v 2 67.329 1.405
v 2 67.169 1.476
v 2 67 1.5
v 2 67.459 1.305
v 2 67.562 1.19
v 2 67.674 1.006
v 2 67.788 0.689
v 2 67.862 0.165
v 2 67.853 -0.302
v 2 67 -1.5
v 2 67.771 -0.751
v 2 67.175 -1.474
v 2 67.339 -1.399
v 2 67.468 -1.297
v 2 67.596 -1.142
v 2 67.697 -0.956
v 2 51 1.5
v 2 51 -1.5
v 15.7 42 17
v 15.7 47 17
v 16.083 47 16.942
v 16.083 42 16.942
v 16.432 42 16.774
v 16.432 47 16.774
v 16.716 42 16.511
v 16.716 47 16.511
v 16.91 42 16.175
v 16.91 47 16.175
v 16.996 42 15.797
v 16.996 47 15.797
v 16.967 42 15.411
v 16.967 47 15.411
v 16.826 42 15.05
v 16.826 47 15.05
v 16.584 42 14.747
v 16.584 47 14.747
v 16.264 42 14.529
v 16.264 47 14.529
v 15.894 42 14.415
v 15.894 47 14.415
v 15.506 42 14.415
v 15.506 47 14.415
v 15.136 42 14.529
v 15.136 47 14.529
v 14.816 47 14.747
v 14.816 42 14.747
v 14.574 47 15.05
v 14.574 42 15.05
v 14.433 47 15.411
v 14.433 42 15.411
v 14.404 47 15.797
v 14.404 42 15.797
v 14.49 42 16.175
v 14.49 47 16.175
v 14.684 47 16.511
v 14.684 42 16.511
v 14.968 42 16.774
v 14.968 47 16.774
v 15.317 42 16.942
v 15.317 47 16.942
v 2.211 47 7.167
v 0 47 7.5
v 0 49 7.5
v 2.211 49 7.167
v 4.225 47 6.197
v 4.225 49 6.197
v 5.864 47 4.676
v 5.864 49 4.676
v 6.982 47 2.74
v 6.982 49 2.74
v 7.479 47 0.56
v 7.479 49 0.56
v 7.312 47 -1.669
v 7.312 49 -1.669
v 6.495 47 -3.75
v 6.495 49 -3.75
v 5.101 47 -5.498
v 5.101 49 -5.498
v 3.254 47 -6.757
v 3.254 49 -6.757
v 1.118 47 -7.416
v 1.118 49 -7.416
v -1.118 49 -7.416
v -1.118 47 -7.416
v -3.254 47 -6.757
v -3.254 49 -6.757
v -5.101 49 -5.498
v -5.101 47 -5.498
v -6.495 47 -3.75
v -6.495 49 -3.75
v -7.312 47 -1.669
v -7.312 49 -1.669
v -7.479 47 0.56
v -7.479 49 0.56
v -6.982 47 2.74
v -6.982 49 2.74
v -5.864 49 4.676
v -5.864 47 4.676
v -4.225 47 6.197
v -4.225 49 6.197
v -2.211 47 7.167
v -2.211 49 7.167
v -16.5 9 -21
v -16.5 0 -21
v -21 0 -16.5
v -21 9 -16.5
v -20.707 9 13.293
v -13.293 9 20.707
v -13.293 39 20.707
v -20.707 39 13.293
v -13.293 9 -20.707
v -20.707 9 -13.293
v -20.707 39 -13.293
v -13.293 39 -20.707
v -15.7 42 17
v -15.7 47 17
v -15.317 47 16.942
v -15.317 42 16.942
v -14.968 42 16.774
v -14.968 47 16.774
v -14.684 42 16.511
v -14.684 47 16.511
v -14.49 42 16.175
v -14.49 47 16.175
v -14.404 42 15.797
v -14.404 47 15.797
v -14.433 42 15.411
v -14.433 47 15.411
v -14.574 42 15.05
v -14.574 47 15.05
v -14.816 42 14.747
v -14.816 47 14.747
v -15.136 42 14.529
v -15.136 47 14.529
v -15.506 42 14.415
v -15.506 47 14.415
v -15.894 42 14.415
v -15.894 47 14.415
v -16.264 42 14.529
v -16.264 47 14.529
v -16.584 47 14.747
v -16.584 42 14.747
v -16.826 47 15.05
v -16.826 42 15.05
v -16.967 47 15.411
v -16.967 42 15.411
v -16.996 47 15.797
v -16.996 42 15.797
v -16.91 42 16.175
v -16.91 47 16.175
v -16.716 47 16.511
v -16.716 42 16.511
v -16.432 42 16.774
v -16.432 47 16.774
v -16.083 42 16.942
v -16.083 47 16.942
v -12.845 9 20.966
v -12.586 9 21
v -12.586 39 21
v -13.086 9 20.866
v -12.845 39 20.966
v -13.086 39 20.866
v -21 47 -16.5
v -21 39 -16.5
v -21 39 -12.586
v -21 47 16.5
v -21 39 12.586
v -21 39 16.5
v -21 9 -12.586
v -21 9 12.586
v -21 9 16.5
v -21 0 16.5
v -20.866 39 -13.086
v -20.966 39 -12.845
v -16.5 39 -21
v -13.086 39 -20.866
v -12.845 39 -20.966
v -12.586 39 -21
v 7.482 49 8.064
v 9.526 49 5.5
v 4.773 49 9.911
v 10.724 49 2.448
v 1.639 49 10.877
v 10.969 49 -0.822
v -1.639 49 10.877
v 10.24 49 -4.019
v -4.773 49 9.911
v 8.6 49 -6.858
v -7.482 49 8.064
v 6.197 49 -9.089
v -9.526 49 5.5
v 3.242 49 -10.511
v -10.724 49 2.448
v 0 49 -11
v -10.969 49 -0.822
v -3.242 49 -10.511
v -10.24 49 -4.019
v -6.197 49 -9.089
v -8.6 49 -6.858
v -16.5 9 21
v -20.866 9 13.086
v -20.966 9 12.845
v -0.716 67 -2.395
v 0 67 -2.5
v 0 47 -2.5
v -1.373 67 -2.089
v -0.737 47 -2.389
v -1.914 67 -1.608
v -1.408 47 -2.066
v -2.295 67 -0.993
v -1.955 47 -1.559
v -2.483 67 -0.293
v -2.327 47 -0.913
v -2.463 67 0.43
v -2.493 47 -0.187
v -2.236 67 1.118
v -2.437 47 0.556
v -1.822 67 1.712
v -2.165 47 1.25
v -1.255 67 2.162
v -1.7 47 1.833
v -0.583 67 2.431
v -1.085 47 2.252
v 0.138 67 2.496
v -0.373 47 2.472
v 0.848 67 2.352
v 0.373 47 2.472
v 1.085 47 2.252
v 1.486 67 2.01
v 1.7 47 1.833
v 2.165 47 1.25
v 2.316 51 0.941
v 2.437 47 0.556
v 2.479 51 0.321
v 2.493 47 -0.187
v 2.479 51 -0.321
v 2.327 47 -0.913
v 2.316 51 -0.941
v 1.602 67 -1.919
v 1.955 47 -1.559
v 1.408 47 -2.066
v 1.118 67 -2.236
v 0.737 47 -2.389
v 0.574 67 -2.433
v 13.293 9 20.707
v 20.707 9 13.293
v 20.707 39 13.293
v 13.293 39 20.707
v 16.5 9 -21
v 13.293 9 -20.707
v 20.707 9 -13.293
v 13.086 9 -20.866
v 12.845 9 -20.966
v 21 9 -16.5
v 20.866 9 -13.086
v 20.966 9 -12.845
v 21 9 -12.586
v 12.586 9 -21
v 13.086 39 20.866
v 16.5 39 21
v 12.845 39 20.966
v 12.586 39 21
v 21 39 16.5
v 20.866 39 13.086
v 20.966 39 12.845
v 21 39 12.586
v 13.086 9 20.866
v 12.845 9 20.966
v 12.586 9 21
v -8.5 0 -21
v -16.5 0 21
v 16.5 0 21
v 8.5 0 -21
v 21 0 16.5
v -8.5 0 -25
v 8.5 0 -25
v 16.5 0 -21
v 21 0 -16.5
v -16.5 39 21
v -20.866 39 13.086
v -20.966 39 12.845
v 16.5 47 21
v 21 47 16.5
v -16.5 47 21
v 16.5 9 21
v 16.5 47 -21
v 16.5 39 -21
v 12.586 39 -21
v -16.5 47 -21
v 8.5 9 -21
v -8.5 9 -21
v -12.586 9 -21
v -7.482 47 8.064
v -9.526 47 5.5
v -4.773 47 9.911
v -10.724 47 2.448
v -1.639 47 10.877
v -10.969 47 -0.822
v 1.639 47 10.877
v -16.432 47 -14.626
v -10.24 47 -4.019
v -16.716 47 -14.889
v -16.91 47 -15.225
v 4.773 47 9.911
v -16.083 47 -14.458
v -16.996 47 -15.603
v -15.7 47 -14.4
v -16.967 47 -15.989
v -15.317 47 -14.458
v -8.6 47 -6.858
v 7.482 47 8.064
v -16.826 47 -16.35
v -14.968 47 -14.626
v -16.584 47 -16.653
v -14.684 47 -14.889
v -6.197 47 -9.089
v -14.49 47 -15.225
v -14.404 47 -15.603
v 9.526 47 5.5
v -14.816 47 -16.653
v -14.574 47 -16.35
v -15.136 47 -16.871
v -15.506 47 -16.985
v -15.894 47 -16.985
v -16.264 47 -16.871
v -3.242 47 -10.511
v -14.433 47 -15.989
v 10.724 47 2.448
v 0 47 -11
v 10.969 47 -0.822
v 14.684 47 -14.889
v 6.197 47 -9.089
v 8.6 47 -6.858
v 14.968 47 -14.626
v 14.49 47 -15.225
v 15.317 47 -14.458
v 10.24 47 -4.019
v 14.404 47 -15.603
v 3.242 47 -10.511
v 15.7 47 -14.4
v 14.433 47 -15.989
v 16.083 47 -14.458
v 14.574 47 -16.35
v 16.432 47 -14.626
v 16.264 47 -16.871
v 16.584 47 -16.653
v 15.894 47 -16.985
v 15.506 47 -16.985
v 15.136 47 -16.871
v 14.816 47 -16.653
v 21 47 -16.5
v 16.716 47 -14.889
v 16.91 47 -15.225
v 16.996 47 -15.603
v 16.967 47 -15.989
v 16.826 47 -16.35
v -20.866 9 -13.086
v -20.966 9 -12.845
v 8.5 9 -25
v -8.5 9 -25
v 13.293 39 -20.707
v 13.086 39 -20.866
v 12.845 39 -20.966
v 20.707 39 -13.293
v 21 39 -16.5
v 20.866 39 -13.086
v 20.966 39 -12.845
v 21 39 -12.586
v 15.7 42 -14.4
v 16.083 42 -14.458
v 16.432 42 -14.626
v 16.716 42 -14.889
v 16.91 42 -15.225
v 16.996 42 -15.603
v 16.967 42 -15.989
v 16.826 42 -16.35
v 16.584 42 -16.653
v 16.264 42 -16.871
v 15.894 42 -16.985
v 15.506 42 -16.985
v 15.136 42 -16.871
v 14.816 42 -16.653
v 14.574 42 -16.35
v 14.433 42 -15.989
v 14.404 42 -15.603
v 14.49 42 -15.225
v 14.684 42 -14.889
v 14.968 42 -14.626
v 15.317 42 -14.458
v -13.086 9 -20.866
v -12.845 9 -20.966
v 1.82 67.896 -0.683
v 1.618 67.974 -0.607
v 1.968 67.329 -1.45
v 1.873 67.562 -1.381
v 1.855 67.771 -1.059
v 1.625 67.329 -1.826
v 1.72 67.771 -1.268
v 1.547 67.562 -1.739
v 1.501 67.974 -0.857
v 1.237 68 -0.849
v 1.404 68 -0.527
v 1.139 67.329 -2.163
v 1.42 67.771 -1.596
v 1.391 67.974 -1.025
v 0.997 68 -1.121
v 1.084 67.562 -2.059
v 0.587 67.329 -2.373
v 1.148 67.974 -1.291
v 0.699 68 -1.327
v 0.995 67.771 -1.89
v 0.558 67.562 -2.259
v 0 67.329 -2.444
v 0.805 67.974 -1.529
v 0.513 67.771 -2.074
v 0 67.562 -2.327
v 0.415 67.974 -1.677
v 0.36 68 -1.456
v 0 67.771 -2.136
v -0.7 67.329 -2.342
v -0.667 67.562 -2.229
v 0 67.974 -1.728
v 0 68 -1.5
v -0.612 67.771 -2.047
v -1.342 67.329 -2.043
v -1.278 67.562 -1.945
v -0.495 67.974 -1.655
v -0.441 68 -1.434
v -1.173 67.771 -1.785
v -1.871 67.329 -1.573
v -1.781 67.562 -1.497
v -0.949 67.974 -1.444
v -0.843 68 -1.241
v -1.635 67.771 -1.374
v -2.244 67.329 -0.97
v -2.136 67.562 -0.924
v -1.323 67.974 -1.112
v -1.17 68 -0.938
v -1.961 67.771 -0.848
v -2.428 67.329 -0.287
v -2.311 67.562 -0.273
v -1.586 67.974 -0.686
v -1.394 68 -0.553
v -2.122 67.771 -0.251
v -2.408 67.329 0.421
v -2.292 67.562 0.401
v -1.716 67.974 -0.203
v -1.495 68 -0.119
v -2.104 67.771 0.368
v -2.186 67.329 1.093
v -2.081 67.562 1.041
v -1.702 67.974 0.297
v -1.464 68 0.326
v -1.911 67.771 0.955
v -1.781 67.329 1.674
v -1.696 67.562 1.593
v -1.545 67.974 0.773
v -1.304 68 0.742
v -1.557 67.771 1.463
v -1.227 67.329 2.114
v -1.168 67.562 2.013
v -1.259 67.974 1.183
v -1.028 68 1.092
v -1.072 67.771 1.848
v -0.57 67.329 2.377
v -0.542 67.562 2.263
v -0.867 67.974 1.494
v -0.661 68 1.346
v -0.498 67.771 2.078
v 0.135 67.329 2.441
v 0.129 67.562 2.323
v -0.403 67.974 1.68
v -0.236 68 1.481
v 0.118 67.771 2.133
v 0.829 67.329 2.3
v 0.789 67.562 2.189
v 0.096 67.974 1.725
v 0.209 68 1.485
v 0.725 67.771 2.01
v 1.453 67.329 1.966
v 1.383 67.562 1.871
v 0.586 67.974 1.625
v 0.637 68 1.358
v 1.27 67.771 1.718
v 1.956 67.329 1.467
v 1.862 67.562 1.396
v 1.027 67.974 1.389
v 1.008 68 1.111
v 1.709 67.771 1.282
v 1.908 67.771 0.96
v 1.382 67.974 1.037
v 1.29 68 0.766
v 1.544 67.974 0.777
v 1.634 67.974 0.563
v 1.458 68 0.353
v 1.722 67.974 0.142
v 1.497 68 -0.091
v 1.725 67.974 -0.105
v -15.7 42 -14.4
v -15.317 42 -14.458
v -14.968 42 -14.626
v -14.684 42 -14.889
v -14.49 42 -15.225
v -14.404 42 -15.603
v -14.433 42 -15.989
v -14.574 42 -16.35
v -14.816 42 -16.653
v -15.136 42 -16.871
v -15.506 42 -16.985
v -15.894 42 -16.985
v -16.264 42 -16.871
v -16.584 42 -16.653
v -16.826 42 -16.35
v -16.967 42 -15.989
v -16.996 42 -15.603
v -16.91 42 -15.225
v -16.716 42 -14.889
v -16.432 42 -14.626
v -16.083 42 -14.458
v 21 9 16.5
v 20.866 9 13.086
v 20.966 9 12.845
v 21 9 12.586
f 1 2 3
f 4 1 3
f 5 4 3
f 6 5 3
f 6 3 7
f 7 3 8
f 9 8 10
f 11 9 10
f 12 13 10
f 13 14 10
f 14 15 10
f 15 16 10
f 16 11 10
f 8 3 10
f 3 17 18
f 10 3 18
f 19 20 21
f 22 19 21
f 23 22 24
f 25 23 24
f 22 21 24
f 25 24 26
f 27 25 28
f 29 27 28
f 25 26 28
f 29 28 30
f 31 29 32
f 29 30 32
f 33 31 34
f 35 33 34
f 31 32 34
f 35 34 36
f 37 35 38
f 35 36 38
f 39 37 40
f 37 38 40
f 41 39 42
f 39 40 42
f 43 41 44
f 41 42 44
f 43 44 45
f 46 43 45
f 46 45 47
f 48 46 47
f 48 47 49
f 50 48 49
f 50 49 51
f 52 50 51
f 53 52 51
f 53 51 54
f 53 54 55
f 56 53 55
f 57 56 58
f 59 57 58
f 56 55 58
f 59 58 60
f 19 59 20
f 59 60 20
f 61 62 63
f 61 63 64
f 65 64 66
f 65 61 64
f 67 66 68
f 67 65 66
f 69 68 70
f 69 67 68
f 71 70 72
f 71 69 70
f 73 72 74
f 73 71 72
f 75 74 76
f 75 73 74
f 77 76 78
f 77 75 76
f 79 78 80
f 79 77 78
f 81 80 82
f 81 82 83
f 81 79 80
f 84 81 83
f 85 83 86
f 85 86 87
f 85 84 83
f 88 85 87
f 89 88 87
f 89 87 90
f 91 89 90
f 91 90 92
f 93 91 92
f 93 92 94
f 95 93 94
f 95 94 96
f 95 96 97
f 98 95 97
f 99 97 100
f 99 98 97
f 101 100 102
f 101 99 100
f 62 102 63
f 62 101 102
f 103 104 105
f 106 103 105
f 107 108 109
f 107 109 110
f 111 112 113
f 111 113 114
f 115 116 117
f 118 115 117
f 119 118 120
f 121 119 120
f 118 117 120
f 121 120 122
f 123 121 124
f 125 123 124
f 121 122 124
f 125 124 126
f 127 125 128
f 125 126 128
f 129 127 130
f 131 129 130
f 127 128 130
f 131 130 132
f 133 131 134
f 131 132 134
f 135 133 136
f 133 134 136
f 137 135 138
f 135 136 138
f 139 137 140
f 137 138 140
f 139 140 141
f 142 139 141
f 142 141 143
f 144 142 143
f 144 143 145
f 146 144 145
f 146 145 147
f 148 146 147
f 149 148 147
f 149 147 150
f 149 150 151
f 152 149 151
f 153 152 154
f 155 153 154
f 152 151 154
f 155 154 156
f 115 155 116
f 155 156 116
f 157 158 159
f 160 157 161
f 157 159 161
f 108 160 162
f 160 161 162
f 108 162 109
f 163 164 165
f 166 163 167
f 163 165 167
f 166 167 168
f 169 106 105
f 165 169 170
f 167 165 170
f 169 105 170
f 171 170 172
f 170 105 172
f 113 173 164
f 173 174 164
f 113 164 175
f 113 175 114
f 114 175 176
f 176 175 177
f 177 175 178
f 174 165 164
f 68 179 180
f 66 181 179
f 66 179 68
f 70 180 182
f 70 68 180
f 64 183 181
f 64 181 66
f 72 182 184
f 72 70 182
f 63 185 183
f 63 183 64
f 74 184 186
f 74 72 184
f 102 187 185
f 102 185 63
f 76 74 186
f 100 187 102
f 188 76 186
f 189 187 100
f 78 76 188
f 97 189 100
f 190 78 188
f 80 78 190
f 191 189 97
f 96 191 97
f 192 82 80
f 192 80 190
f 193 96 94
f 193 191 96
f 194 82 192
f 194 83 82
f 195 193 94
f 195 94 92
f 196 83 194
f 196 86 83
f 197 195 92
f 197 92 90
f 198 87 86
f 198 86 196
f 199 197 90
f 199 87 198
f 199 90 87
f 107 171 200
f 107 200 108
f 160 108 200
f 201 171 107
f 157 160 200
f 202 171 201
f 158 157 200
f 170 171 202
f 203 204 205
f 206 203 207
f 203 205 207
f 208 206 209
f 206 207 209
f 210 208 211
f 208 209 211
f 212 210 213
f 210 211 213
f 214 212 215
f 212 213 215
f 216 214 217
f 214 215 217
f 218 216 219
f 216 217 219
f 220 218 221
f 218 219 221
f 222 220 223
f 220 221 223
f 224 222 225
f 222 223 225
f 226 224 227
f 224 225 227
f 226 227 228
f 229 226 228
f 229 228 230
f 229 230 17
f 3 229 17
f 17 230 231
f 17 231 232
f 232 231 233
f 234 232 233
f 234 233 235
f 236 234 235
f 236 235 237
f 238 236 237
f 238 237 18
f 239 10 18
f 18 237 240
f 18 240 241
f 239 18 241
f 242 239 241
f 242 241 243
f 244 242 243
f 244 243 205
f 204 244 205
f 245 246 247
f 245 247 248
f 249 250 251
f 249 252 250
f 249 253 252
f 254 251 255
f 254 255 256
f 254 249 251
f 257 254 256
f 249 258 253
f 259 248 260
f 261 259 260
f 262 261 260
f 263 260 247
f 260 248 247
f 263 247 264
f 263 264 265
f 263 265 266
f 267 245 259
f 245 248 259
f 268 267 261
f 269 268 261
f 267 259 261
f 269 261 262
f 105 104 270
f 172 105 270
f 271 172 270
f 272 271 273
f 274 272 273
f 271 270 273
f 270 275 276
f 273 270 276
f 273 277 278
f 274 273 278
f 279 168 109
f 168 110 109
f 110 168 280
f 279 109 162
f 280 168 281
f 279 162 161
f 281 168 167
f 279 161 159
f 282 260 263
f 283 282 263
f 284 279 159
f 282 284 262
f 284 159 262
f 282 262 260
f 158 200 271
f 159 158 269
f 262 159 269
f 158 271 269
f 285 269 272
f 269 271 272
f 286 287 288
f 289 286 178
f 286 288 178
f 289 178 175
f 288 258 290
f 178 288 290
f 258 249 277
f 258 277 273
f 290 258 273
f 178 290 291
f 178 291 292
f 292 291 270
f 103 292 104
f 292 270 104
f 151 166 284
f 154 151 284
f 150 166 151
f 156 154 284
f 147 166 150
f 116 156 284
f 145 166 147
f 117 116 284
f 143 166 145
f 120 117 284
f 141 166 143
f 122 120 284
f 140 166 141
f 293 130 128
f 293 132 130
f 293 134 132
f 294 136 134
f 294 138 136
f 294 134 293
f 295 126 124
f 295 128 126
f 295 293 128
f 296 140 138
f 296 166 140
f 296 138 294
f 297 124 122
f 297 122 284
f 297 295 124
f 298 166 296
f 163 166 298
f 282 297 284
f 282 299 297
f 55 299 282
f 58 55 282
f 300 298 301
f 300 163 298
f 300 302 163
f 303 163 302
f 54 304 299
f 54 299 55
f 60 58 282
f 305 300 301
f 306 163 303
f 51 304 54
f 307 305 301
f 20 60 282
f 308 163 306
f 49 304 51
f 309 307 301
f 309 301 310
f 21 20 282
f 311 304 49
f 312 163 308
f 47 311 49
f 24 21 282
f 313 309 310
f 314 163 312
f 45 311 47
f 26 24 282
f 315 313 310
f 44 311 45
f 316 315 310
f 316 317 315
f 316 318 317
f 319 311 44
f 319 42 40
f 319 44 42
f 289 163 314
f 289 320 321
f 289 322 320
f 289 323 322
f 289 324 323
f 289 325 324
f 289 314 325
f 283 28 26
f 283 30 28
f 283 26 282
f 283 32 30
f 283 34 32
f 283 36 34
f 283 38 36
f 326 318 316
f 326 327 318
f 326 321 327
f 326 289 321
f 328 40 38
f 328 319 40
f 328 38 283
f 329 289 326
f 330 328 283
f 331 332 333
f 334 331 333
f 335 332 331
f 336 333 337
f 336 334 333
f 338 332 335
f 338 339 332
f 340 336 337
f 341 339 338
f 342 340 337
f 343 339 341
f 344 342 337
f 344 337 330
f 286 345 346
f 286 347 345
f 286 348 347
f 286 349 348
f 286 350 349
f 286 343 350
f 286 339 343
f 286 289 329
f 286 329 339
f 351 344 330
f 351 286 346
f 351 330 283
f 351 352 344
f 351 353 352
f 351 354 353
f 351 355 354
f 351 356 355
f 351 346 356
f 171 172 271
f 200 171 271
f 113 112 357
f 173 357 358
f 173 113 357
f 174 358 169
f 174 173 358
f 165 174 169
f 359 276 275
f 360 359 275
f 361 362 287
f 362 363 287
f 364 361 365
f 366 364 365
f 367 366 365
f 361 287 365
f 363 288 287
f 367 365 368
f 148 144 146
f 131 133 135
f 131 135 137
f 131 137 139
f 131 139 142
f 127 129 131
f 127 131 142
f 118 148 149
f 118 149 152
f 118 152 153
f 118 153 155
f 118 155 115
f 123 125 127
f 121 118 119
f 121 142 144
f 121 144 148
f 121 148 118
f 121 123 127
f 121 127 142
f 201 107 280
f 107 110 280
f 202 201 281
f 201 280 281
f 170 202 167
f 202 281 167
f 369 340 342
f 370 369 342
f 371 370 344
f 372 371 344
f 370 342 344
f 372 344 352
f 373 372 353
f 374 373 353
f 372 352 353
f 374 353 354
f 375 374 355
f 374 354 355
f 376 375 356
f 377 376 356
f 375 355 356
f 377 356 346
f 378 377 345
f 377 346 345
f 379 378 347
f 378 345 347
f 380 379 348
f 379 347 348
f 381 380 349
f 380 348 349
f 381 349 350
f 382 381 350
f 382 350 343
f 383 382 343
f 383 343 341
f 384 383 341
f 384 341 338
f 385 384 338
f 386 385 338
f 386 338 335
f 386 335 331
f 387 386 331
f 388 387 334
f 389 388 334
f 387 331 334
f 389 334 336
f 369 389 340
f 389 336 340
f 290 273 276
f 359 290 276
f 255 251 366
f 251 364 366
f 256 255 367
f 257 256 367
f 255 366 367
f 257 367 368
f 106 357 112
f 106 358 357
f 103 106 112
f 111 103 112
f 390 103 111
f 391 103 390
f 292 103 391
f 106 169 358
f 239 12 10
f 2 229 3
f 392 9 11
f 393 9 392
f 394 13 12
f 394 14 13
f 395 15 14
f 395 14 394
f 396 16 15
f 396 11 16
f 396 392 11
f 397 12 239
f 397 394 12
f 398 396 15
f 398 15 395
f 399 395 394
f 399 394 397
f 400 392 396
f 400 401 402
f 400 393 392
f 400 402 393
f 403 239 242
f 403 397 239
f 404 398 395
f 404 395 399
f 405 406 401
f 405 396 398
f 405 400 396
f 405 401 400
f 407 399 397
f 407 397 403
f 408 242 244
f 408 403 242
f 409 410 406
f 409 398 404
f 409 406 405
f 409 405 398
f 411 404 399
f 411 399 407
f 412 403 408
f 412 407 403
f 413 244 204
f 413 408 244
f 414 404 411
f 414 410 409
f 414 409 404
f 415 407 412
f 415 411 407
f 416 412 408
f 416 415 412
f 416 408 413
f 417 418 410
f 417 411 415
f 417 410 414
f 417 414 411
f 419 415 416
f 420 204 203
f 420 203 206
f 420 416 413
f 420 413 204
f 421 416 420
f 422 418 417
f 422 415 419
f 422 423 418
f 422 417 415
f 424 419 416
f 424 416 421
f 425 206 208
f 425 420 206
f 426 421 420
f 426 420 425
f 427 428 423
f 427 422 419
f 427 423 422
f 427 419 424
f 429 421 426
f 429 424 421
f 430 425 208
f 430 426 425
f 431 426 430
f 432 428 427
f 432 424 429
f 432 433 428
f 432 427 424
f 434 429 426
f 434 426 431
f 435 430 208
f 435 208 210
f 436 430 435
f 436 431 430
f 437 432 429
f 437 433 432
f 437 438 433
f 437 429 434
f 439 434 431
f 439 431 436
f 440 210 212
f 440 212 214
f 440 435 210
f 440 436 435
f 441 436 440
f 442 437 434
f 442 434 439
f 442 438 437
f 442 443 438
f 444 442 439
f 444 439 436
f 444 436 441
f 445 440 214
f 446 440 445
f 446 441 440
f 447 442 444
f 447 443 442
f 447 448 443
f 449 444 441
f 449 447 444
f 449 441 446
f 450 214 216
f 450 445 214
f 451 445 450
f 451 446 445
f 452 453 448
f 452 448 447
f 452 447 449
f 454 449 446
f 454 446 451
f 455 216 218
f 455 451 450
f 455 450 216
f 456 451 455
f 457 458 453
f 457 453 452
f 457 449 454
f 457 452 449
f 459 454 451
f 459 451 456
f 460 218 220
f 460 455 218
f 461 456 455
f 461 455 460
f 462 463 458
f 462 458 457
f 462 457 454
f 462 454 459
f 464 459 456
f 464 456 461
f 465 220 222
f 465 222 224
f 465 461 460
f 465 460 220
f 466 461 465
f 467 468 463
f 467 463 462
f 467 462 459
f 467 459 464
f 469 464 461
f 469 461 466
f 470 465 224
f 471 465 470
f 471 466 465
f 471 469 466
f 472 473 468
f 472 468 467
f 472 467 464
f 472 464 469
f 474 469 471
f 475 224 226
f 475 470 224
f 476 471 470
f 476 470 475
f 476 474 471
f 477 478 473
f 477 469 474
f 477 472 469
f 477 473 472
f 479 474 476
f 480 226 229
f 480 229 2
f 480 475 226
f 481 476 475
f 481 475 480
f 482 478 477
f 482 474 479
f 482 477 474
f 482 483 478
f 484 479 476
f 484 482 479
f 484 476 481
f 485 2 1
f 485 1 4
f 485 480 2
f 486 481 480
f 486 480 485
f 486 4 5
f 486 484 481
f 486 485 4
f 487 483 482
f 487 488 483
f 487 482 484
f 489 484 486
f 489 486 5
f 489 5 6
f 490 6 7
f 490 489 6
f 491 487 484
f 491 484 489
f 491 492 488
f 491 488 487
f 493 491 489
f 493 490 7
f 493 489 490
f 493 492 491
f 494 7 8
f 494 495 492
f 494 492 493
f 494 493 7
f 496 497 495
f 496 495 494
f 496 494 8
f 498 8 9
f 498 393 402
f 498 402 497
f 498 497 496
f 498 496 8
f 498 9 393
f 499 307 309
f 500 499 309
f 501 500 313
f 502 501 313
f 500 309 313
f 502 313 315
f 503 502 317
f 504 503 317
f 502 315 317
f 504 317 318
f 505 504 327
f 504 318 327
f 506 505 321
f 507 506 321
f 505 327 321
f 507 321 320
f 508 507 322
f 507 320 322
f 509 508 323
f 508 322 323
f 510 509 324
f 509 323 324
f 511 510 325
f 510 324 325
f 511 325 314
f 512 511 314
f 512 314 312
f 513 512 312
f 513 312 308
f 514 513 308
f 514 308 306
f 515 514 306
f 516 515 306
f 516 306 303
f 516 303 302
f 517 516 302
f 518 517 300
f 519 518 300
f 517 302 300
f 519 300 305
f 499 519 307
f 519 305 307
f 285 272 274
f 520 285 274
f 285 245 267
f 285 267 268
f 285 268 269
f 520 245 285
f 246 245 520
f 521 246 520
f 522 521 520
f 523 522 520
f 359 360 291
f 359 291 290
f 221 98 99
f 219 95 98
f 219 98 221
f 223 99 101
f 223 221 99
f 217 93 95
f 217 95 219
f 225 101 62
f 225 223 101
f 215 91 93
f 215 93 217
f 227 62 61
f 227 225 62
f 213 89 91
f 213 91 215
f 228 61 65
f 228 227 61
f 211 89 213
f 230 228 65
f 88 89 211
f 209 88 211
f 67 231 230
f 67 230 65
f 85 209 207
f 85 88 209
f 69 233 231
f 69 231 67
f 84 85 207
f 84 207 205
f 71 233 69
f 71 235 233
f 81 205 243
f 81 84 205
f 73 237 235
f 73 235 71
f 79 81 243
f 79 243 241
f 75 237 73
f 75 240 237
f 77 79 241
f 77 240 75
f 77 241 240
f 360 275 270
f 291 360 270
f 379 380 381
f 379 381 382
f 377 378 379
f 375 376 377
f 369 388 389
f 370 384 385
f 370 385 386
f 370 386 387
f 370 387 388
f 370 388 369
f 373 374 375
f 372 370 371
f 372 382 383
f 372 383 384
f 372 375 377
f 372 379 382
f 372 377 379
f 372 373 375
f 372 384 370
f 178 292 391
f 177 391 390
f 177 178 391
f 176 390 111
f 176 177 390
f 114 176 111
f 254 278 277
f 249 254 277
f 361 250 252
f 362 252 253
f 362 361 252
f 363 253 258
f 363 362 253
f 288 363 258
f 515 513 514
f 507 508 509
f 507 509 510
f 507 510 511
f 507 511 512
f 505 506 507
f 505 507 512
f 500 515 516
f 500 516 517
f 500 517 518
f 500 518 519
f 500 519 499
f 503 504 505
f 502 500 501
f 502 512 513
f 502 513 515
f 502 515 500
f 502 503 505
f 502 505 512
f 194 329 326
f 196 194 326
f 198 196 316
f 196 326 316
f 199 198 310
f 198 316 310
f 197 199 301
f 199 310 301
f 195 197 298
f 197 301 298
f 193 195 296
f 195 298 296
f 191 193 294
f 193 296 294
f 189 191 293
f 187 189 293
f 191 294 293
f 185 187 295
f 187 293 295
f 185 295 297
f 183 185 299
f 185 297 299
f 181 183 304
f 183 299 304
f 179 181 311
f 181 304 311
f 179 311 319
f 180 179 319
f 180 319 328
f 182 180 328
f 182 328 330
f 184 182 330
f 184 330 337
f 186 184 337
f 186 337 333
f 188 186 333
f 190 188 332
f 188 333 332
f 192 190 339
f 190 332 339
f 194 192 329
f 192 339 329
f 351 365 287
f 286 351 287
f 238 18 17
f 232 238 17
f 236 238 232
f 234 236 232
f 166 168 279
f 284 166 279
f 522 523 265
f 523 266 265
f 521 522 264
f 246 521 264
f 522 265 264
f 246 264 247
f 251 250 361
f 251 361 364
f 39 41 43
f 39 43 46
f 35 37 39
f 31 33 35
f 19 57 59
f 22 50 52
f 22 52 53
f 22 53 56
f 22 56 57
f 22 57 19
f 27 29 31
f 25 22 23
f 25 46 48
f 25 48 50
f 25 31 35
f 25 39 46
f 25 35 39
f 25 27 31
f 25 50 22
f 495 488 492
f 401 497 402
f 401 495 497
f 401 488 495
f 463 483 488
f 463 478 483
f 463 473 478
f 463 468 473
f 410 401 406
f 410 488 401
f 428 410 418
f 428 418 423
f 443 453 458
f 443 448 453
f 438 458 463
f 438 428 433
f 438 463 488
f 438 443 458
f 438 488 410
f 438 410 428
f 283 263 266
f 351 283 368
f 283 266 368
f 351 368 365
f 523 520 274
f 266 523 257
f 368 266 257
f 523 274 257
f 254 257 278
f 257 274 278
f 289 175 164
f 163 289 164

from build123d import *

# Parameters (mm, degrees)
SALIENTE_EXTRUIR1_DEPTH = 9
SALIENTE_EXTRUIR2_START = 9
SALIENTE_EXTRUIR2_DEPTH = 30
REDONDEO3_R             = 1
SALIENTE_EXTRUIR3_START = 39
SALIENTE_EXTRUIR3_DEPTH = 8
CORTAR_EXTRUIR1_START   = 47
CROQUIS4_R              = 1.3
CORTAR_EXTRUIR1_DEPTH   = 5
SALIENTE_EXTRUIR4_START = 47
CROQUIS5_R              = 11
CROQUIS5_R_2            = 7.5
SALIENTE_EXTRUIR4_DEPTH = 2
SALIENTE_EXTRUIR5_START = 47
CROQUIS6_R              = 2.5
SALIENTE_EXTRUIR5_DEPTH = 21
CORTAR_EXTRUIR2_START   = 51
CORTAR_EXTRUIR2_DEPTH   = 17
REDONDEO4_R             = 1


with BuildPart() as part:
    # Croquis1 → Saliente-Extruir1 (new body)
    with BuildSketch(Plane(origin=(0, 0, 0), x_dir=(1, 0, 0), z_dir=(0, 1, 0))):
        Polygon((-16.5, 21), (-21, 16.5), (-21, -16.5), (-16.5, -21), (16.5, -21), (21, -16.5), (21, 16.5), (16.5, 21), (8.5, 21), (8.5, 25), (-8.5, 25), (-8.5, 21), align=None)
    extrude(amount=SALIENTE_EXTRUIR1_DEPTH)

    # Croquis2 → Saliente-Extruir2 (add)
    with BuildSketch(Plane(origin=(0, 0, 0), x_dir=(1, 0, 0), z_dir=(0, 1, 0)).offset(SALIENTE_EXTRUIR2_START)):
        Polygon((13, 21), (21, 13), (21, -13), (13, -21), (-13, -21), (-21, -13), (-21, 13), (-13, 21), align=None)
    extrude(amount=SALIENTE_EXTRUIR2_DEPTH)

    # Redondeo3
    redondeo3_edges = [part.edges().sort_by_distance(p)[0] for p in [
        (13, 24, -21),
        (-13, 24, -21),
        (-21, 24, -13),
        (-21, 24, 13),
        (-13, 24, 21),
        (13, 24, 21),
        (21, 24, 13),
        (21, 24, -13),
    ]]
    fillet(redondeo3_edges, radius=REDONDEO3_R)

    # Croquis3 → Saliente-Extruir3 (add)
    with BuildSketch(Plane(origin=(0, 0, 0), x_dir=(1, 0, 0), z_dir=(0, 1, 0)).offset(SALIENTE_EXTRUIR3_START)):
        Polygon((-16.5, 21), (-21, 16.5), (-21, -16.5), (-16.5, -21), (16.5, -21), (21, -16.5), (21, 16.5), (16.5, 21), align=None)
    extrude(amount=SALIENTE_EXTRUIR3_DEPTH)

    # Croquis4 → Cortar-Extruir1 (cut)
    with BuildSketch(Plane(origin=(0, 0, 0), x_dir=(1, 0, 0), z_dir=(0, 1, 0)).offset(CORTAR_EXTRUIR1_START)):
        with Locations(Location((-15.7, 15.7, 0), (0, 0, 270))):
            Circle(CROQUIS4_R)
        with Locations(Location((15.7, 15.7, 0), (0, 0, 270))):
            Circle(CROQUIS4_R)
        with Locations(Location((15.7, -15.7, 0), (0, 0, 270))):
            Circle(CROQUIS4_R)
        with Locations(Location((-15.7, -15.7, 0), (0, 0, 270))):
            Circle(CROQUIS4_R)
    extrude(amount=-CORTAR_EXTRUIR1_DEPTH, mode=Mode.SUBTRACT)

    # Croquis5 → Saliente-Extruir4 (add)
    with BuildSketch(Plane(origin=(0, 0, 0), x_dir=(1, 0, 0), z_dir=(0, 1, 0)).offset(SALIENTE_EXTRUIR4_START)):
        with Locations(Location((0, 0, 0), (0, 0, 90))):
            Circle(CROQUIS5_R)
        with Locations(Location((0, 0, 0), (0, 0, 270))):
            Circle(CROQUIS5_R_2, mode=Mode.SUBTRACT)
    extrude(amount=SALIENTE_EXTRUIR4_DEPTH)

    # Croquis6 → Saliente-Extruir5 (add)
    with BuildSketch(Plane(origin=(0, 0, 0), x_dir=(1, 0, 0), z_dir=(0, 1, 0)).offset(SALIENTE_EXTRUIR5_START)):
        with Locations(Location((0, 0, 0), (0, 0, 90))):
            Circle(CROQUIS6_R)
    extrude(amount=SALIENTE_EXTRUIR5_DEPTH)

    # Croquis7 → Cortar-Extruir2 (cut)
    with BuildSketch(Plane(origin=(0, 0, 0), x_dir=(1, 0, 0), z_dir=(0, 1, 0)).offset(CORTAR_EXTRUIR2_START)):
        with BuildLine():
            Line((2, -1.5), (2, 1.5))
            ThreePointArc((2, 1.5), (2.5, 0), (2, -1.5))
        make_face()
    extrude(amount=CORTAR_EXTRUIR2_DEPTH, mode=Mode.SUBTRACT)

    # Redondeo4
    # the kernel refuses this fillet: 1 mm, written as the material it takes off along each edge
    with BuildSketch(Plane(origin=(0, 68, 0), x_dir=(0, 0, -1), z_dir=(1, 0, 0))) as redondeo4_piece_1:
        with BuildLine():
            CenterArc((2.5 - REDONDEO4_R, -REDONDEO4_R), REDONDEO4_R, 0, 90)
            Line((2.5 - REDONDEO4_R, 0), (2.5, 0))
            Line((2.5, 0), (2.5, -REDONDEO4_R))
        make_face()
    revolve(axis=Axis((0, 68, 0), (0, 1, 0)), revolution_arc=290.580564901, mode=Mode.SUBTRACT)
    with BuildSketch(Plane(origin=(0, 68, 0), x_dir=(0.9370755783657725, 0, 0.34912656792408847), z_dir=(-0.34912656792408847, 0, 0.9370755783657725))) as redondeo4_piece_2:
        with BuildLine():
            CenterArc((2.5 - REDONDEO4_R, -REDONDEO4_R), REDONDEO4_R, 0, 90)
            Line((2.5 - REDONDEO4_R, 0), (2.5, 0))
            Line((2.5, 0), (2.5, -REDONDEO4_R))
        make_face()
    revolve(axis=Axis((0, 68, 0), (0, 1, 0)), revolution_arc=110.433901418, mode=Mode.SUBTRACT)


solid = part.part
